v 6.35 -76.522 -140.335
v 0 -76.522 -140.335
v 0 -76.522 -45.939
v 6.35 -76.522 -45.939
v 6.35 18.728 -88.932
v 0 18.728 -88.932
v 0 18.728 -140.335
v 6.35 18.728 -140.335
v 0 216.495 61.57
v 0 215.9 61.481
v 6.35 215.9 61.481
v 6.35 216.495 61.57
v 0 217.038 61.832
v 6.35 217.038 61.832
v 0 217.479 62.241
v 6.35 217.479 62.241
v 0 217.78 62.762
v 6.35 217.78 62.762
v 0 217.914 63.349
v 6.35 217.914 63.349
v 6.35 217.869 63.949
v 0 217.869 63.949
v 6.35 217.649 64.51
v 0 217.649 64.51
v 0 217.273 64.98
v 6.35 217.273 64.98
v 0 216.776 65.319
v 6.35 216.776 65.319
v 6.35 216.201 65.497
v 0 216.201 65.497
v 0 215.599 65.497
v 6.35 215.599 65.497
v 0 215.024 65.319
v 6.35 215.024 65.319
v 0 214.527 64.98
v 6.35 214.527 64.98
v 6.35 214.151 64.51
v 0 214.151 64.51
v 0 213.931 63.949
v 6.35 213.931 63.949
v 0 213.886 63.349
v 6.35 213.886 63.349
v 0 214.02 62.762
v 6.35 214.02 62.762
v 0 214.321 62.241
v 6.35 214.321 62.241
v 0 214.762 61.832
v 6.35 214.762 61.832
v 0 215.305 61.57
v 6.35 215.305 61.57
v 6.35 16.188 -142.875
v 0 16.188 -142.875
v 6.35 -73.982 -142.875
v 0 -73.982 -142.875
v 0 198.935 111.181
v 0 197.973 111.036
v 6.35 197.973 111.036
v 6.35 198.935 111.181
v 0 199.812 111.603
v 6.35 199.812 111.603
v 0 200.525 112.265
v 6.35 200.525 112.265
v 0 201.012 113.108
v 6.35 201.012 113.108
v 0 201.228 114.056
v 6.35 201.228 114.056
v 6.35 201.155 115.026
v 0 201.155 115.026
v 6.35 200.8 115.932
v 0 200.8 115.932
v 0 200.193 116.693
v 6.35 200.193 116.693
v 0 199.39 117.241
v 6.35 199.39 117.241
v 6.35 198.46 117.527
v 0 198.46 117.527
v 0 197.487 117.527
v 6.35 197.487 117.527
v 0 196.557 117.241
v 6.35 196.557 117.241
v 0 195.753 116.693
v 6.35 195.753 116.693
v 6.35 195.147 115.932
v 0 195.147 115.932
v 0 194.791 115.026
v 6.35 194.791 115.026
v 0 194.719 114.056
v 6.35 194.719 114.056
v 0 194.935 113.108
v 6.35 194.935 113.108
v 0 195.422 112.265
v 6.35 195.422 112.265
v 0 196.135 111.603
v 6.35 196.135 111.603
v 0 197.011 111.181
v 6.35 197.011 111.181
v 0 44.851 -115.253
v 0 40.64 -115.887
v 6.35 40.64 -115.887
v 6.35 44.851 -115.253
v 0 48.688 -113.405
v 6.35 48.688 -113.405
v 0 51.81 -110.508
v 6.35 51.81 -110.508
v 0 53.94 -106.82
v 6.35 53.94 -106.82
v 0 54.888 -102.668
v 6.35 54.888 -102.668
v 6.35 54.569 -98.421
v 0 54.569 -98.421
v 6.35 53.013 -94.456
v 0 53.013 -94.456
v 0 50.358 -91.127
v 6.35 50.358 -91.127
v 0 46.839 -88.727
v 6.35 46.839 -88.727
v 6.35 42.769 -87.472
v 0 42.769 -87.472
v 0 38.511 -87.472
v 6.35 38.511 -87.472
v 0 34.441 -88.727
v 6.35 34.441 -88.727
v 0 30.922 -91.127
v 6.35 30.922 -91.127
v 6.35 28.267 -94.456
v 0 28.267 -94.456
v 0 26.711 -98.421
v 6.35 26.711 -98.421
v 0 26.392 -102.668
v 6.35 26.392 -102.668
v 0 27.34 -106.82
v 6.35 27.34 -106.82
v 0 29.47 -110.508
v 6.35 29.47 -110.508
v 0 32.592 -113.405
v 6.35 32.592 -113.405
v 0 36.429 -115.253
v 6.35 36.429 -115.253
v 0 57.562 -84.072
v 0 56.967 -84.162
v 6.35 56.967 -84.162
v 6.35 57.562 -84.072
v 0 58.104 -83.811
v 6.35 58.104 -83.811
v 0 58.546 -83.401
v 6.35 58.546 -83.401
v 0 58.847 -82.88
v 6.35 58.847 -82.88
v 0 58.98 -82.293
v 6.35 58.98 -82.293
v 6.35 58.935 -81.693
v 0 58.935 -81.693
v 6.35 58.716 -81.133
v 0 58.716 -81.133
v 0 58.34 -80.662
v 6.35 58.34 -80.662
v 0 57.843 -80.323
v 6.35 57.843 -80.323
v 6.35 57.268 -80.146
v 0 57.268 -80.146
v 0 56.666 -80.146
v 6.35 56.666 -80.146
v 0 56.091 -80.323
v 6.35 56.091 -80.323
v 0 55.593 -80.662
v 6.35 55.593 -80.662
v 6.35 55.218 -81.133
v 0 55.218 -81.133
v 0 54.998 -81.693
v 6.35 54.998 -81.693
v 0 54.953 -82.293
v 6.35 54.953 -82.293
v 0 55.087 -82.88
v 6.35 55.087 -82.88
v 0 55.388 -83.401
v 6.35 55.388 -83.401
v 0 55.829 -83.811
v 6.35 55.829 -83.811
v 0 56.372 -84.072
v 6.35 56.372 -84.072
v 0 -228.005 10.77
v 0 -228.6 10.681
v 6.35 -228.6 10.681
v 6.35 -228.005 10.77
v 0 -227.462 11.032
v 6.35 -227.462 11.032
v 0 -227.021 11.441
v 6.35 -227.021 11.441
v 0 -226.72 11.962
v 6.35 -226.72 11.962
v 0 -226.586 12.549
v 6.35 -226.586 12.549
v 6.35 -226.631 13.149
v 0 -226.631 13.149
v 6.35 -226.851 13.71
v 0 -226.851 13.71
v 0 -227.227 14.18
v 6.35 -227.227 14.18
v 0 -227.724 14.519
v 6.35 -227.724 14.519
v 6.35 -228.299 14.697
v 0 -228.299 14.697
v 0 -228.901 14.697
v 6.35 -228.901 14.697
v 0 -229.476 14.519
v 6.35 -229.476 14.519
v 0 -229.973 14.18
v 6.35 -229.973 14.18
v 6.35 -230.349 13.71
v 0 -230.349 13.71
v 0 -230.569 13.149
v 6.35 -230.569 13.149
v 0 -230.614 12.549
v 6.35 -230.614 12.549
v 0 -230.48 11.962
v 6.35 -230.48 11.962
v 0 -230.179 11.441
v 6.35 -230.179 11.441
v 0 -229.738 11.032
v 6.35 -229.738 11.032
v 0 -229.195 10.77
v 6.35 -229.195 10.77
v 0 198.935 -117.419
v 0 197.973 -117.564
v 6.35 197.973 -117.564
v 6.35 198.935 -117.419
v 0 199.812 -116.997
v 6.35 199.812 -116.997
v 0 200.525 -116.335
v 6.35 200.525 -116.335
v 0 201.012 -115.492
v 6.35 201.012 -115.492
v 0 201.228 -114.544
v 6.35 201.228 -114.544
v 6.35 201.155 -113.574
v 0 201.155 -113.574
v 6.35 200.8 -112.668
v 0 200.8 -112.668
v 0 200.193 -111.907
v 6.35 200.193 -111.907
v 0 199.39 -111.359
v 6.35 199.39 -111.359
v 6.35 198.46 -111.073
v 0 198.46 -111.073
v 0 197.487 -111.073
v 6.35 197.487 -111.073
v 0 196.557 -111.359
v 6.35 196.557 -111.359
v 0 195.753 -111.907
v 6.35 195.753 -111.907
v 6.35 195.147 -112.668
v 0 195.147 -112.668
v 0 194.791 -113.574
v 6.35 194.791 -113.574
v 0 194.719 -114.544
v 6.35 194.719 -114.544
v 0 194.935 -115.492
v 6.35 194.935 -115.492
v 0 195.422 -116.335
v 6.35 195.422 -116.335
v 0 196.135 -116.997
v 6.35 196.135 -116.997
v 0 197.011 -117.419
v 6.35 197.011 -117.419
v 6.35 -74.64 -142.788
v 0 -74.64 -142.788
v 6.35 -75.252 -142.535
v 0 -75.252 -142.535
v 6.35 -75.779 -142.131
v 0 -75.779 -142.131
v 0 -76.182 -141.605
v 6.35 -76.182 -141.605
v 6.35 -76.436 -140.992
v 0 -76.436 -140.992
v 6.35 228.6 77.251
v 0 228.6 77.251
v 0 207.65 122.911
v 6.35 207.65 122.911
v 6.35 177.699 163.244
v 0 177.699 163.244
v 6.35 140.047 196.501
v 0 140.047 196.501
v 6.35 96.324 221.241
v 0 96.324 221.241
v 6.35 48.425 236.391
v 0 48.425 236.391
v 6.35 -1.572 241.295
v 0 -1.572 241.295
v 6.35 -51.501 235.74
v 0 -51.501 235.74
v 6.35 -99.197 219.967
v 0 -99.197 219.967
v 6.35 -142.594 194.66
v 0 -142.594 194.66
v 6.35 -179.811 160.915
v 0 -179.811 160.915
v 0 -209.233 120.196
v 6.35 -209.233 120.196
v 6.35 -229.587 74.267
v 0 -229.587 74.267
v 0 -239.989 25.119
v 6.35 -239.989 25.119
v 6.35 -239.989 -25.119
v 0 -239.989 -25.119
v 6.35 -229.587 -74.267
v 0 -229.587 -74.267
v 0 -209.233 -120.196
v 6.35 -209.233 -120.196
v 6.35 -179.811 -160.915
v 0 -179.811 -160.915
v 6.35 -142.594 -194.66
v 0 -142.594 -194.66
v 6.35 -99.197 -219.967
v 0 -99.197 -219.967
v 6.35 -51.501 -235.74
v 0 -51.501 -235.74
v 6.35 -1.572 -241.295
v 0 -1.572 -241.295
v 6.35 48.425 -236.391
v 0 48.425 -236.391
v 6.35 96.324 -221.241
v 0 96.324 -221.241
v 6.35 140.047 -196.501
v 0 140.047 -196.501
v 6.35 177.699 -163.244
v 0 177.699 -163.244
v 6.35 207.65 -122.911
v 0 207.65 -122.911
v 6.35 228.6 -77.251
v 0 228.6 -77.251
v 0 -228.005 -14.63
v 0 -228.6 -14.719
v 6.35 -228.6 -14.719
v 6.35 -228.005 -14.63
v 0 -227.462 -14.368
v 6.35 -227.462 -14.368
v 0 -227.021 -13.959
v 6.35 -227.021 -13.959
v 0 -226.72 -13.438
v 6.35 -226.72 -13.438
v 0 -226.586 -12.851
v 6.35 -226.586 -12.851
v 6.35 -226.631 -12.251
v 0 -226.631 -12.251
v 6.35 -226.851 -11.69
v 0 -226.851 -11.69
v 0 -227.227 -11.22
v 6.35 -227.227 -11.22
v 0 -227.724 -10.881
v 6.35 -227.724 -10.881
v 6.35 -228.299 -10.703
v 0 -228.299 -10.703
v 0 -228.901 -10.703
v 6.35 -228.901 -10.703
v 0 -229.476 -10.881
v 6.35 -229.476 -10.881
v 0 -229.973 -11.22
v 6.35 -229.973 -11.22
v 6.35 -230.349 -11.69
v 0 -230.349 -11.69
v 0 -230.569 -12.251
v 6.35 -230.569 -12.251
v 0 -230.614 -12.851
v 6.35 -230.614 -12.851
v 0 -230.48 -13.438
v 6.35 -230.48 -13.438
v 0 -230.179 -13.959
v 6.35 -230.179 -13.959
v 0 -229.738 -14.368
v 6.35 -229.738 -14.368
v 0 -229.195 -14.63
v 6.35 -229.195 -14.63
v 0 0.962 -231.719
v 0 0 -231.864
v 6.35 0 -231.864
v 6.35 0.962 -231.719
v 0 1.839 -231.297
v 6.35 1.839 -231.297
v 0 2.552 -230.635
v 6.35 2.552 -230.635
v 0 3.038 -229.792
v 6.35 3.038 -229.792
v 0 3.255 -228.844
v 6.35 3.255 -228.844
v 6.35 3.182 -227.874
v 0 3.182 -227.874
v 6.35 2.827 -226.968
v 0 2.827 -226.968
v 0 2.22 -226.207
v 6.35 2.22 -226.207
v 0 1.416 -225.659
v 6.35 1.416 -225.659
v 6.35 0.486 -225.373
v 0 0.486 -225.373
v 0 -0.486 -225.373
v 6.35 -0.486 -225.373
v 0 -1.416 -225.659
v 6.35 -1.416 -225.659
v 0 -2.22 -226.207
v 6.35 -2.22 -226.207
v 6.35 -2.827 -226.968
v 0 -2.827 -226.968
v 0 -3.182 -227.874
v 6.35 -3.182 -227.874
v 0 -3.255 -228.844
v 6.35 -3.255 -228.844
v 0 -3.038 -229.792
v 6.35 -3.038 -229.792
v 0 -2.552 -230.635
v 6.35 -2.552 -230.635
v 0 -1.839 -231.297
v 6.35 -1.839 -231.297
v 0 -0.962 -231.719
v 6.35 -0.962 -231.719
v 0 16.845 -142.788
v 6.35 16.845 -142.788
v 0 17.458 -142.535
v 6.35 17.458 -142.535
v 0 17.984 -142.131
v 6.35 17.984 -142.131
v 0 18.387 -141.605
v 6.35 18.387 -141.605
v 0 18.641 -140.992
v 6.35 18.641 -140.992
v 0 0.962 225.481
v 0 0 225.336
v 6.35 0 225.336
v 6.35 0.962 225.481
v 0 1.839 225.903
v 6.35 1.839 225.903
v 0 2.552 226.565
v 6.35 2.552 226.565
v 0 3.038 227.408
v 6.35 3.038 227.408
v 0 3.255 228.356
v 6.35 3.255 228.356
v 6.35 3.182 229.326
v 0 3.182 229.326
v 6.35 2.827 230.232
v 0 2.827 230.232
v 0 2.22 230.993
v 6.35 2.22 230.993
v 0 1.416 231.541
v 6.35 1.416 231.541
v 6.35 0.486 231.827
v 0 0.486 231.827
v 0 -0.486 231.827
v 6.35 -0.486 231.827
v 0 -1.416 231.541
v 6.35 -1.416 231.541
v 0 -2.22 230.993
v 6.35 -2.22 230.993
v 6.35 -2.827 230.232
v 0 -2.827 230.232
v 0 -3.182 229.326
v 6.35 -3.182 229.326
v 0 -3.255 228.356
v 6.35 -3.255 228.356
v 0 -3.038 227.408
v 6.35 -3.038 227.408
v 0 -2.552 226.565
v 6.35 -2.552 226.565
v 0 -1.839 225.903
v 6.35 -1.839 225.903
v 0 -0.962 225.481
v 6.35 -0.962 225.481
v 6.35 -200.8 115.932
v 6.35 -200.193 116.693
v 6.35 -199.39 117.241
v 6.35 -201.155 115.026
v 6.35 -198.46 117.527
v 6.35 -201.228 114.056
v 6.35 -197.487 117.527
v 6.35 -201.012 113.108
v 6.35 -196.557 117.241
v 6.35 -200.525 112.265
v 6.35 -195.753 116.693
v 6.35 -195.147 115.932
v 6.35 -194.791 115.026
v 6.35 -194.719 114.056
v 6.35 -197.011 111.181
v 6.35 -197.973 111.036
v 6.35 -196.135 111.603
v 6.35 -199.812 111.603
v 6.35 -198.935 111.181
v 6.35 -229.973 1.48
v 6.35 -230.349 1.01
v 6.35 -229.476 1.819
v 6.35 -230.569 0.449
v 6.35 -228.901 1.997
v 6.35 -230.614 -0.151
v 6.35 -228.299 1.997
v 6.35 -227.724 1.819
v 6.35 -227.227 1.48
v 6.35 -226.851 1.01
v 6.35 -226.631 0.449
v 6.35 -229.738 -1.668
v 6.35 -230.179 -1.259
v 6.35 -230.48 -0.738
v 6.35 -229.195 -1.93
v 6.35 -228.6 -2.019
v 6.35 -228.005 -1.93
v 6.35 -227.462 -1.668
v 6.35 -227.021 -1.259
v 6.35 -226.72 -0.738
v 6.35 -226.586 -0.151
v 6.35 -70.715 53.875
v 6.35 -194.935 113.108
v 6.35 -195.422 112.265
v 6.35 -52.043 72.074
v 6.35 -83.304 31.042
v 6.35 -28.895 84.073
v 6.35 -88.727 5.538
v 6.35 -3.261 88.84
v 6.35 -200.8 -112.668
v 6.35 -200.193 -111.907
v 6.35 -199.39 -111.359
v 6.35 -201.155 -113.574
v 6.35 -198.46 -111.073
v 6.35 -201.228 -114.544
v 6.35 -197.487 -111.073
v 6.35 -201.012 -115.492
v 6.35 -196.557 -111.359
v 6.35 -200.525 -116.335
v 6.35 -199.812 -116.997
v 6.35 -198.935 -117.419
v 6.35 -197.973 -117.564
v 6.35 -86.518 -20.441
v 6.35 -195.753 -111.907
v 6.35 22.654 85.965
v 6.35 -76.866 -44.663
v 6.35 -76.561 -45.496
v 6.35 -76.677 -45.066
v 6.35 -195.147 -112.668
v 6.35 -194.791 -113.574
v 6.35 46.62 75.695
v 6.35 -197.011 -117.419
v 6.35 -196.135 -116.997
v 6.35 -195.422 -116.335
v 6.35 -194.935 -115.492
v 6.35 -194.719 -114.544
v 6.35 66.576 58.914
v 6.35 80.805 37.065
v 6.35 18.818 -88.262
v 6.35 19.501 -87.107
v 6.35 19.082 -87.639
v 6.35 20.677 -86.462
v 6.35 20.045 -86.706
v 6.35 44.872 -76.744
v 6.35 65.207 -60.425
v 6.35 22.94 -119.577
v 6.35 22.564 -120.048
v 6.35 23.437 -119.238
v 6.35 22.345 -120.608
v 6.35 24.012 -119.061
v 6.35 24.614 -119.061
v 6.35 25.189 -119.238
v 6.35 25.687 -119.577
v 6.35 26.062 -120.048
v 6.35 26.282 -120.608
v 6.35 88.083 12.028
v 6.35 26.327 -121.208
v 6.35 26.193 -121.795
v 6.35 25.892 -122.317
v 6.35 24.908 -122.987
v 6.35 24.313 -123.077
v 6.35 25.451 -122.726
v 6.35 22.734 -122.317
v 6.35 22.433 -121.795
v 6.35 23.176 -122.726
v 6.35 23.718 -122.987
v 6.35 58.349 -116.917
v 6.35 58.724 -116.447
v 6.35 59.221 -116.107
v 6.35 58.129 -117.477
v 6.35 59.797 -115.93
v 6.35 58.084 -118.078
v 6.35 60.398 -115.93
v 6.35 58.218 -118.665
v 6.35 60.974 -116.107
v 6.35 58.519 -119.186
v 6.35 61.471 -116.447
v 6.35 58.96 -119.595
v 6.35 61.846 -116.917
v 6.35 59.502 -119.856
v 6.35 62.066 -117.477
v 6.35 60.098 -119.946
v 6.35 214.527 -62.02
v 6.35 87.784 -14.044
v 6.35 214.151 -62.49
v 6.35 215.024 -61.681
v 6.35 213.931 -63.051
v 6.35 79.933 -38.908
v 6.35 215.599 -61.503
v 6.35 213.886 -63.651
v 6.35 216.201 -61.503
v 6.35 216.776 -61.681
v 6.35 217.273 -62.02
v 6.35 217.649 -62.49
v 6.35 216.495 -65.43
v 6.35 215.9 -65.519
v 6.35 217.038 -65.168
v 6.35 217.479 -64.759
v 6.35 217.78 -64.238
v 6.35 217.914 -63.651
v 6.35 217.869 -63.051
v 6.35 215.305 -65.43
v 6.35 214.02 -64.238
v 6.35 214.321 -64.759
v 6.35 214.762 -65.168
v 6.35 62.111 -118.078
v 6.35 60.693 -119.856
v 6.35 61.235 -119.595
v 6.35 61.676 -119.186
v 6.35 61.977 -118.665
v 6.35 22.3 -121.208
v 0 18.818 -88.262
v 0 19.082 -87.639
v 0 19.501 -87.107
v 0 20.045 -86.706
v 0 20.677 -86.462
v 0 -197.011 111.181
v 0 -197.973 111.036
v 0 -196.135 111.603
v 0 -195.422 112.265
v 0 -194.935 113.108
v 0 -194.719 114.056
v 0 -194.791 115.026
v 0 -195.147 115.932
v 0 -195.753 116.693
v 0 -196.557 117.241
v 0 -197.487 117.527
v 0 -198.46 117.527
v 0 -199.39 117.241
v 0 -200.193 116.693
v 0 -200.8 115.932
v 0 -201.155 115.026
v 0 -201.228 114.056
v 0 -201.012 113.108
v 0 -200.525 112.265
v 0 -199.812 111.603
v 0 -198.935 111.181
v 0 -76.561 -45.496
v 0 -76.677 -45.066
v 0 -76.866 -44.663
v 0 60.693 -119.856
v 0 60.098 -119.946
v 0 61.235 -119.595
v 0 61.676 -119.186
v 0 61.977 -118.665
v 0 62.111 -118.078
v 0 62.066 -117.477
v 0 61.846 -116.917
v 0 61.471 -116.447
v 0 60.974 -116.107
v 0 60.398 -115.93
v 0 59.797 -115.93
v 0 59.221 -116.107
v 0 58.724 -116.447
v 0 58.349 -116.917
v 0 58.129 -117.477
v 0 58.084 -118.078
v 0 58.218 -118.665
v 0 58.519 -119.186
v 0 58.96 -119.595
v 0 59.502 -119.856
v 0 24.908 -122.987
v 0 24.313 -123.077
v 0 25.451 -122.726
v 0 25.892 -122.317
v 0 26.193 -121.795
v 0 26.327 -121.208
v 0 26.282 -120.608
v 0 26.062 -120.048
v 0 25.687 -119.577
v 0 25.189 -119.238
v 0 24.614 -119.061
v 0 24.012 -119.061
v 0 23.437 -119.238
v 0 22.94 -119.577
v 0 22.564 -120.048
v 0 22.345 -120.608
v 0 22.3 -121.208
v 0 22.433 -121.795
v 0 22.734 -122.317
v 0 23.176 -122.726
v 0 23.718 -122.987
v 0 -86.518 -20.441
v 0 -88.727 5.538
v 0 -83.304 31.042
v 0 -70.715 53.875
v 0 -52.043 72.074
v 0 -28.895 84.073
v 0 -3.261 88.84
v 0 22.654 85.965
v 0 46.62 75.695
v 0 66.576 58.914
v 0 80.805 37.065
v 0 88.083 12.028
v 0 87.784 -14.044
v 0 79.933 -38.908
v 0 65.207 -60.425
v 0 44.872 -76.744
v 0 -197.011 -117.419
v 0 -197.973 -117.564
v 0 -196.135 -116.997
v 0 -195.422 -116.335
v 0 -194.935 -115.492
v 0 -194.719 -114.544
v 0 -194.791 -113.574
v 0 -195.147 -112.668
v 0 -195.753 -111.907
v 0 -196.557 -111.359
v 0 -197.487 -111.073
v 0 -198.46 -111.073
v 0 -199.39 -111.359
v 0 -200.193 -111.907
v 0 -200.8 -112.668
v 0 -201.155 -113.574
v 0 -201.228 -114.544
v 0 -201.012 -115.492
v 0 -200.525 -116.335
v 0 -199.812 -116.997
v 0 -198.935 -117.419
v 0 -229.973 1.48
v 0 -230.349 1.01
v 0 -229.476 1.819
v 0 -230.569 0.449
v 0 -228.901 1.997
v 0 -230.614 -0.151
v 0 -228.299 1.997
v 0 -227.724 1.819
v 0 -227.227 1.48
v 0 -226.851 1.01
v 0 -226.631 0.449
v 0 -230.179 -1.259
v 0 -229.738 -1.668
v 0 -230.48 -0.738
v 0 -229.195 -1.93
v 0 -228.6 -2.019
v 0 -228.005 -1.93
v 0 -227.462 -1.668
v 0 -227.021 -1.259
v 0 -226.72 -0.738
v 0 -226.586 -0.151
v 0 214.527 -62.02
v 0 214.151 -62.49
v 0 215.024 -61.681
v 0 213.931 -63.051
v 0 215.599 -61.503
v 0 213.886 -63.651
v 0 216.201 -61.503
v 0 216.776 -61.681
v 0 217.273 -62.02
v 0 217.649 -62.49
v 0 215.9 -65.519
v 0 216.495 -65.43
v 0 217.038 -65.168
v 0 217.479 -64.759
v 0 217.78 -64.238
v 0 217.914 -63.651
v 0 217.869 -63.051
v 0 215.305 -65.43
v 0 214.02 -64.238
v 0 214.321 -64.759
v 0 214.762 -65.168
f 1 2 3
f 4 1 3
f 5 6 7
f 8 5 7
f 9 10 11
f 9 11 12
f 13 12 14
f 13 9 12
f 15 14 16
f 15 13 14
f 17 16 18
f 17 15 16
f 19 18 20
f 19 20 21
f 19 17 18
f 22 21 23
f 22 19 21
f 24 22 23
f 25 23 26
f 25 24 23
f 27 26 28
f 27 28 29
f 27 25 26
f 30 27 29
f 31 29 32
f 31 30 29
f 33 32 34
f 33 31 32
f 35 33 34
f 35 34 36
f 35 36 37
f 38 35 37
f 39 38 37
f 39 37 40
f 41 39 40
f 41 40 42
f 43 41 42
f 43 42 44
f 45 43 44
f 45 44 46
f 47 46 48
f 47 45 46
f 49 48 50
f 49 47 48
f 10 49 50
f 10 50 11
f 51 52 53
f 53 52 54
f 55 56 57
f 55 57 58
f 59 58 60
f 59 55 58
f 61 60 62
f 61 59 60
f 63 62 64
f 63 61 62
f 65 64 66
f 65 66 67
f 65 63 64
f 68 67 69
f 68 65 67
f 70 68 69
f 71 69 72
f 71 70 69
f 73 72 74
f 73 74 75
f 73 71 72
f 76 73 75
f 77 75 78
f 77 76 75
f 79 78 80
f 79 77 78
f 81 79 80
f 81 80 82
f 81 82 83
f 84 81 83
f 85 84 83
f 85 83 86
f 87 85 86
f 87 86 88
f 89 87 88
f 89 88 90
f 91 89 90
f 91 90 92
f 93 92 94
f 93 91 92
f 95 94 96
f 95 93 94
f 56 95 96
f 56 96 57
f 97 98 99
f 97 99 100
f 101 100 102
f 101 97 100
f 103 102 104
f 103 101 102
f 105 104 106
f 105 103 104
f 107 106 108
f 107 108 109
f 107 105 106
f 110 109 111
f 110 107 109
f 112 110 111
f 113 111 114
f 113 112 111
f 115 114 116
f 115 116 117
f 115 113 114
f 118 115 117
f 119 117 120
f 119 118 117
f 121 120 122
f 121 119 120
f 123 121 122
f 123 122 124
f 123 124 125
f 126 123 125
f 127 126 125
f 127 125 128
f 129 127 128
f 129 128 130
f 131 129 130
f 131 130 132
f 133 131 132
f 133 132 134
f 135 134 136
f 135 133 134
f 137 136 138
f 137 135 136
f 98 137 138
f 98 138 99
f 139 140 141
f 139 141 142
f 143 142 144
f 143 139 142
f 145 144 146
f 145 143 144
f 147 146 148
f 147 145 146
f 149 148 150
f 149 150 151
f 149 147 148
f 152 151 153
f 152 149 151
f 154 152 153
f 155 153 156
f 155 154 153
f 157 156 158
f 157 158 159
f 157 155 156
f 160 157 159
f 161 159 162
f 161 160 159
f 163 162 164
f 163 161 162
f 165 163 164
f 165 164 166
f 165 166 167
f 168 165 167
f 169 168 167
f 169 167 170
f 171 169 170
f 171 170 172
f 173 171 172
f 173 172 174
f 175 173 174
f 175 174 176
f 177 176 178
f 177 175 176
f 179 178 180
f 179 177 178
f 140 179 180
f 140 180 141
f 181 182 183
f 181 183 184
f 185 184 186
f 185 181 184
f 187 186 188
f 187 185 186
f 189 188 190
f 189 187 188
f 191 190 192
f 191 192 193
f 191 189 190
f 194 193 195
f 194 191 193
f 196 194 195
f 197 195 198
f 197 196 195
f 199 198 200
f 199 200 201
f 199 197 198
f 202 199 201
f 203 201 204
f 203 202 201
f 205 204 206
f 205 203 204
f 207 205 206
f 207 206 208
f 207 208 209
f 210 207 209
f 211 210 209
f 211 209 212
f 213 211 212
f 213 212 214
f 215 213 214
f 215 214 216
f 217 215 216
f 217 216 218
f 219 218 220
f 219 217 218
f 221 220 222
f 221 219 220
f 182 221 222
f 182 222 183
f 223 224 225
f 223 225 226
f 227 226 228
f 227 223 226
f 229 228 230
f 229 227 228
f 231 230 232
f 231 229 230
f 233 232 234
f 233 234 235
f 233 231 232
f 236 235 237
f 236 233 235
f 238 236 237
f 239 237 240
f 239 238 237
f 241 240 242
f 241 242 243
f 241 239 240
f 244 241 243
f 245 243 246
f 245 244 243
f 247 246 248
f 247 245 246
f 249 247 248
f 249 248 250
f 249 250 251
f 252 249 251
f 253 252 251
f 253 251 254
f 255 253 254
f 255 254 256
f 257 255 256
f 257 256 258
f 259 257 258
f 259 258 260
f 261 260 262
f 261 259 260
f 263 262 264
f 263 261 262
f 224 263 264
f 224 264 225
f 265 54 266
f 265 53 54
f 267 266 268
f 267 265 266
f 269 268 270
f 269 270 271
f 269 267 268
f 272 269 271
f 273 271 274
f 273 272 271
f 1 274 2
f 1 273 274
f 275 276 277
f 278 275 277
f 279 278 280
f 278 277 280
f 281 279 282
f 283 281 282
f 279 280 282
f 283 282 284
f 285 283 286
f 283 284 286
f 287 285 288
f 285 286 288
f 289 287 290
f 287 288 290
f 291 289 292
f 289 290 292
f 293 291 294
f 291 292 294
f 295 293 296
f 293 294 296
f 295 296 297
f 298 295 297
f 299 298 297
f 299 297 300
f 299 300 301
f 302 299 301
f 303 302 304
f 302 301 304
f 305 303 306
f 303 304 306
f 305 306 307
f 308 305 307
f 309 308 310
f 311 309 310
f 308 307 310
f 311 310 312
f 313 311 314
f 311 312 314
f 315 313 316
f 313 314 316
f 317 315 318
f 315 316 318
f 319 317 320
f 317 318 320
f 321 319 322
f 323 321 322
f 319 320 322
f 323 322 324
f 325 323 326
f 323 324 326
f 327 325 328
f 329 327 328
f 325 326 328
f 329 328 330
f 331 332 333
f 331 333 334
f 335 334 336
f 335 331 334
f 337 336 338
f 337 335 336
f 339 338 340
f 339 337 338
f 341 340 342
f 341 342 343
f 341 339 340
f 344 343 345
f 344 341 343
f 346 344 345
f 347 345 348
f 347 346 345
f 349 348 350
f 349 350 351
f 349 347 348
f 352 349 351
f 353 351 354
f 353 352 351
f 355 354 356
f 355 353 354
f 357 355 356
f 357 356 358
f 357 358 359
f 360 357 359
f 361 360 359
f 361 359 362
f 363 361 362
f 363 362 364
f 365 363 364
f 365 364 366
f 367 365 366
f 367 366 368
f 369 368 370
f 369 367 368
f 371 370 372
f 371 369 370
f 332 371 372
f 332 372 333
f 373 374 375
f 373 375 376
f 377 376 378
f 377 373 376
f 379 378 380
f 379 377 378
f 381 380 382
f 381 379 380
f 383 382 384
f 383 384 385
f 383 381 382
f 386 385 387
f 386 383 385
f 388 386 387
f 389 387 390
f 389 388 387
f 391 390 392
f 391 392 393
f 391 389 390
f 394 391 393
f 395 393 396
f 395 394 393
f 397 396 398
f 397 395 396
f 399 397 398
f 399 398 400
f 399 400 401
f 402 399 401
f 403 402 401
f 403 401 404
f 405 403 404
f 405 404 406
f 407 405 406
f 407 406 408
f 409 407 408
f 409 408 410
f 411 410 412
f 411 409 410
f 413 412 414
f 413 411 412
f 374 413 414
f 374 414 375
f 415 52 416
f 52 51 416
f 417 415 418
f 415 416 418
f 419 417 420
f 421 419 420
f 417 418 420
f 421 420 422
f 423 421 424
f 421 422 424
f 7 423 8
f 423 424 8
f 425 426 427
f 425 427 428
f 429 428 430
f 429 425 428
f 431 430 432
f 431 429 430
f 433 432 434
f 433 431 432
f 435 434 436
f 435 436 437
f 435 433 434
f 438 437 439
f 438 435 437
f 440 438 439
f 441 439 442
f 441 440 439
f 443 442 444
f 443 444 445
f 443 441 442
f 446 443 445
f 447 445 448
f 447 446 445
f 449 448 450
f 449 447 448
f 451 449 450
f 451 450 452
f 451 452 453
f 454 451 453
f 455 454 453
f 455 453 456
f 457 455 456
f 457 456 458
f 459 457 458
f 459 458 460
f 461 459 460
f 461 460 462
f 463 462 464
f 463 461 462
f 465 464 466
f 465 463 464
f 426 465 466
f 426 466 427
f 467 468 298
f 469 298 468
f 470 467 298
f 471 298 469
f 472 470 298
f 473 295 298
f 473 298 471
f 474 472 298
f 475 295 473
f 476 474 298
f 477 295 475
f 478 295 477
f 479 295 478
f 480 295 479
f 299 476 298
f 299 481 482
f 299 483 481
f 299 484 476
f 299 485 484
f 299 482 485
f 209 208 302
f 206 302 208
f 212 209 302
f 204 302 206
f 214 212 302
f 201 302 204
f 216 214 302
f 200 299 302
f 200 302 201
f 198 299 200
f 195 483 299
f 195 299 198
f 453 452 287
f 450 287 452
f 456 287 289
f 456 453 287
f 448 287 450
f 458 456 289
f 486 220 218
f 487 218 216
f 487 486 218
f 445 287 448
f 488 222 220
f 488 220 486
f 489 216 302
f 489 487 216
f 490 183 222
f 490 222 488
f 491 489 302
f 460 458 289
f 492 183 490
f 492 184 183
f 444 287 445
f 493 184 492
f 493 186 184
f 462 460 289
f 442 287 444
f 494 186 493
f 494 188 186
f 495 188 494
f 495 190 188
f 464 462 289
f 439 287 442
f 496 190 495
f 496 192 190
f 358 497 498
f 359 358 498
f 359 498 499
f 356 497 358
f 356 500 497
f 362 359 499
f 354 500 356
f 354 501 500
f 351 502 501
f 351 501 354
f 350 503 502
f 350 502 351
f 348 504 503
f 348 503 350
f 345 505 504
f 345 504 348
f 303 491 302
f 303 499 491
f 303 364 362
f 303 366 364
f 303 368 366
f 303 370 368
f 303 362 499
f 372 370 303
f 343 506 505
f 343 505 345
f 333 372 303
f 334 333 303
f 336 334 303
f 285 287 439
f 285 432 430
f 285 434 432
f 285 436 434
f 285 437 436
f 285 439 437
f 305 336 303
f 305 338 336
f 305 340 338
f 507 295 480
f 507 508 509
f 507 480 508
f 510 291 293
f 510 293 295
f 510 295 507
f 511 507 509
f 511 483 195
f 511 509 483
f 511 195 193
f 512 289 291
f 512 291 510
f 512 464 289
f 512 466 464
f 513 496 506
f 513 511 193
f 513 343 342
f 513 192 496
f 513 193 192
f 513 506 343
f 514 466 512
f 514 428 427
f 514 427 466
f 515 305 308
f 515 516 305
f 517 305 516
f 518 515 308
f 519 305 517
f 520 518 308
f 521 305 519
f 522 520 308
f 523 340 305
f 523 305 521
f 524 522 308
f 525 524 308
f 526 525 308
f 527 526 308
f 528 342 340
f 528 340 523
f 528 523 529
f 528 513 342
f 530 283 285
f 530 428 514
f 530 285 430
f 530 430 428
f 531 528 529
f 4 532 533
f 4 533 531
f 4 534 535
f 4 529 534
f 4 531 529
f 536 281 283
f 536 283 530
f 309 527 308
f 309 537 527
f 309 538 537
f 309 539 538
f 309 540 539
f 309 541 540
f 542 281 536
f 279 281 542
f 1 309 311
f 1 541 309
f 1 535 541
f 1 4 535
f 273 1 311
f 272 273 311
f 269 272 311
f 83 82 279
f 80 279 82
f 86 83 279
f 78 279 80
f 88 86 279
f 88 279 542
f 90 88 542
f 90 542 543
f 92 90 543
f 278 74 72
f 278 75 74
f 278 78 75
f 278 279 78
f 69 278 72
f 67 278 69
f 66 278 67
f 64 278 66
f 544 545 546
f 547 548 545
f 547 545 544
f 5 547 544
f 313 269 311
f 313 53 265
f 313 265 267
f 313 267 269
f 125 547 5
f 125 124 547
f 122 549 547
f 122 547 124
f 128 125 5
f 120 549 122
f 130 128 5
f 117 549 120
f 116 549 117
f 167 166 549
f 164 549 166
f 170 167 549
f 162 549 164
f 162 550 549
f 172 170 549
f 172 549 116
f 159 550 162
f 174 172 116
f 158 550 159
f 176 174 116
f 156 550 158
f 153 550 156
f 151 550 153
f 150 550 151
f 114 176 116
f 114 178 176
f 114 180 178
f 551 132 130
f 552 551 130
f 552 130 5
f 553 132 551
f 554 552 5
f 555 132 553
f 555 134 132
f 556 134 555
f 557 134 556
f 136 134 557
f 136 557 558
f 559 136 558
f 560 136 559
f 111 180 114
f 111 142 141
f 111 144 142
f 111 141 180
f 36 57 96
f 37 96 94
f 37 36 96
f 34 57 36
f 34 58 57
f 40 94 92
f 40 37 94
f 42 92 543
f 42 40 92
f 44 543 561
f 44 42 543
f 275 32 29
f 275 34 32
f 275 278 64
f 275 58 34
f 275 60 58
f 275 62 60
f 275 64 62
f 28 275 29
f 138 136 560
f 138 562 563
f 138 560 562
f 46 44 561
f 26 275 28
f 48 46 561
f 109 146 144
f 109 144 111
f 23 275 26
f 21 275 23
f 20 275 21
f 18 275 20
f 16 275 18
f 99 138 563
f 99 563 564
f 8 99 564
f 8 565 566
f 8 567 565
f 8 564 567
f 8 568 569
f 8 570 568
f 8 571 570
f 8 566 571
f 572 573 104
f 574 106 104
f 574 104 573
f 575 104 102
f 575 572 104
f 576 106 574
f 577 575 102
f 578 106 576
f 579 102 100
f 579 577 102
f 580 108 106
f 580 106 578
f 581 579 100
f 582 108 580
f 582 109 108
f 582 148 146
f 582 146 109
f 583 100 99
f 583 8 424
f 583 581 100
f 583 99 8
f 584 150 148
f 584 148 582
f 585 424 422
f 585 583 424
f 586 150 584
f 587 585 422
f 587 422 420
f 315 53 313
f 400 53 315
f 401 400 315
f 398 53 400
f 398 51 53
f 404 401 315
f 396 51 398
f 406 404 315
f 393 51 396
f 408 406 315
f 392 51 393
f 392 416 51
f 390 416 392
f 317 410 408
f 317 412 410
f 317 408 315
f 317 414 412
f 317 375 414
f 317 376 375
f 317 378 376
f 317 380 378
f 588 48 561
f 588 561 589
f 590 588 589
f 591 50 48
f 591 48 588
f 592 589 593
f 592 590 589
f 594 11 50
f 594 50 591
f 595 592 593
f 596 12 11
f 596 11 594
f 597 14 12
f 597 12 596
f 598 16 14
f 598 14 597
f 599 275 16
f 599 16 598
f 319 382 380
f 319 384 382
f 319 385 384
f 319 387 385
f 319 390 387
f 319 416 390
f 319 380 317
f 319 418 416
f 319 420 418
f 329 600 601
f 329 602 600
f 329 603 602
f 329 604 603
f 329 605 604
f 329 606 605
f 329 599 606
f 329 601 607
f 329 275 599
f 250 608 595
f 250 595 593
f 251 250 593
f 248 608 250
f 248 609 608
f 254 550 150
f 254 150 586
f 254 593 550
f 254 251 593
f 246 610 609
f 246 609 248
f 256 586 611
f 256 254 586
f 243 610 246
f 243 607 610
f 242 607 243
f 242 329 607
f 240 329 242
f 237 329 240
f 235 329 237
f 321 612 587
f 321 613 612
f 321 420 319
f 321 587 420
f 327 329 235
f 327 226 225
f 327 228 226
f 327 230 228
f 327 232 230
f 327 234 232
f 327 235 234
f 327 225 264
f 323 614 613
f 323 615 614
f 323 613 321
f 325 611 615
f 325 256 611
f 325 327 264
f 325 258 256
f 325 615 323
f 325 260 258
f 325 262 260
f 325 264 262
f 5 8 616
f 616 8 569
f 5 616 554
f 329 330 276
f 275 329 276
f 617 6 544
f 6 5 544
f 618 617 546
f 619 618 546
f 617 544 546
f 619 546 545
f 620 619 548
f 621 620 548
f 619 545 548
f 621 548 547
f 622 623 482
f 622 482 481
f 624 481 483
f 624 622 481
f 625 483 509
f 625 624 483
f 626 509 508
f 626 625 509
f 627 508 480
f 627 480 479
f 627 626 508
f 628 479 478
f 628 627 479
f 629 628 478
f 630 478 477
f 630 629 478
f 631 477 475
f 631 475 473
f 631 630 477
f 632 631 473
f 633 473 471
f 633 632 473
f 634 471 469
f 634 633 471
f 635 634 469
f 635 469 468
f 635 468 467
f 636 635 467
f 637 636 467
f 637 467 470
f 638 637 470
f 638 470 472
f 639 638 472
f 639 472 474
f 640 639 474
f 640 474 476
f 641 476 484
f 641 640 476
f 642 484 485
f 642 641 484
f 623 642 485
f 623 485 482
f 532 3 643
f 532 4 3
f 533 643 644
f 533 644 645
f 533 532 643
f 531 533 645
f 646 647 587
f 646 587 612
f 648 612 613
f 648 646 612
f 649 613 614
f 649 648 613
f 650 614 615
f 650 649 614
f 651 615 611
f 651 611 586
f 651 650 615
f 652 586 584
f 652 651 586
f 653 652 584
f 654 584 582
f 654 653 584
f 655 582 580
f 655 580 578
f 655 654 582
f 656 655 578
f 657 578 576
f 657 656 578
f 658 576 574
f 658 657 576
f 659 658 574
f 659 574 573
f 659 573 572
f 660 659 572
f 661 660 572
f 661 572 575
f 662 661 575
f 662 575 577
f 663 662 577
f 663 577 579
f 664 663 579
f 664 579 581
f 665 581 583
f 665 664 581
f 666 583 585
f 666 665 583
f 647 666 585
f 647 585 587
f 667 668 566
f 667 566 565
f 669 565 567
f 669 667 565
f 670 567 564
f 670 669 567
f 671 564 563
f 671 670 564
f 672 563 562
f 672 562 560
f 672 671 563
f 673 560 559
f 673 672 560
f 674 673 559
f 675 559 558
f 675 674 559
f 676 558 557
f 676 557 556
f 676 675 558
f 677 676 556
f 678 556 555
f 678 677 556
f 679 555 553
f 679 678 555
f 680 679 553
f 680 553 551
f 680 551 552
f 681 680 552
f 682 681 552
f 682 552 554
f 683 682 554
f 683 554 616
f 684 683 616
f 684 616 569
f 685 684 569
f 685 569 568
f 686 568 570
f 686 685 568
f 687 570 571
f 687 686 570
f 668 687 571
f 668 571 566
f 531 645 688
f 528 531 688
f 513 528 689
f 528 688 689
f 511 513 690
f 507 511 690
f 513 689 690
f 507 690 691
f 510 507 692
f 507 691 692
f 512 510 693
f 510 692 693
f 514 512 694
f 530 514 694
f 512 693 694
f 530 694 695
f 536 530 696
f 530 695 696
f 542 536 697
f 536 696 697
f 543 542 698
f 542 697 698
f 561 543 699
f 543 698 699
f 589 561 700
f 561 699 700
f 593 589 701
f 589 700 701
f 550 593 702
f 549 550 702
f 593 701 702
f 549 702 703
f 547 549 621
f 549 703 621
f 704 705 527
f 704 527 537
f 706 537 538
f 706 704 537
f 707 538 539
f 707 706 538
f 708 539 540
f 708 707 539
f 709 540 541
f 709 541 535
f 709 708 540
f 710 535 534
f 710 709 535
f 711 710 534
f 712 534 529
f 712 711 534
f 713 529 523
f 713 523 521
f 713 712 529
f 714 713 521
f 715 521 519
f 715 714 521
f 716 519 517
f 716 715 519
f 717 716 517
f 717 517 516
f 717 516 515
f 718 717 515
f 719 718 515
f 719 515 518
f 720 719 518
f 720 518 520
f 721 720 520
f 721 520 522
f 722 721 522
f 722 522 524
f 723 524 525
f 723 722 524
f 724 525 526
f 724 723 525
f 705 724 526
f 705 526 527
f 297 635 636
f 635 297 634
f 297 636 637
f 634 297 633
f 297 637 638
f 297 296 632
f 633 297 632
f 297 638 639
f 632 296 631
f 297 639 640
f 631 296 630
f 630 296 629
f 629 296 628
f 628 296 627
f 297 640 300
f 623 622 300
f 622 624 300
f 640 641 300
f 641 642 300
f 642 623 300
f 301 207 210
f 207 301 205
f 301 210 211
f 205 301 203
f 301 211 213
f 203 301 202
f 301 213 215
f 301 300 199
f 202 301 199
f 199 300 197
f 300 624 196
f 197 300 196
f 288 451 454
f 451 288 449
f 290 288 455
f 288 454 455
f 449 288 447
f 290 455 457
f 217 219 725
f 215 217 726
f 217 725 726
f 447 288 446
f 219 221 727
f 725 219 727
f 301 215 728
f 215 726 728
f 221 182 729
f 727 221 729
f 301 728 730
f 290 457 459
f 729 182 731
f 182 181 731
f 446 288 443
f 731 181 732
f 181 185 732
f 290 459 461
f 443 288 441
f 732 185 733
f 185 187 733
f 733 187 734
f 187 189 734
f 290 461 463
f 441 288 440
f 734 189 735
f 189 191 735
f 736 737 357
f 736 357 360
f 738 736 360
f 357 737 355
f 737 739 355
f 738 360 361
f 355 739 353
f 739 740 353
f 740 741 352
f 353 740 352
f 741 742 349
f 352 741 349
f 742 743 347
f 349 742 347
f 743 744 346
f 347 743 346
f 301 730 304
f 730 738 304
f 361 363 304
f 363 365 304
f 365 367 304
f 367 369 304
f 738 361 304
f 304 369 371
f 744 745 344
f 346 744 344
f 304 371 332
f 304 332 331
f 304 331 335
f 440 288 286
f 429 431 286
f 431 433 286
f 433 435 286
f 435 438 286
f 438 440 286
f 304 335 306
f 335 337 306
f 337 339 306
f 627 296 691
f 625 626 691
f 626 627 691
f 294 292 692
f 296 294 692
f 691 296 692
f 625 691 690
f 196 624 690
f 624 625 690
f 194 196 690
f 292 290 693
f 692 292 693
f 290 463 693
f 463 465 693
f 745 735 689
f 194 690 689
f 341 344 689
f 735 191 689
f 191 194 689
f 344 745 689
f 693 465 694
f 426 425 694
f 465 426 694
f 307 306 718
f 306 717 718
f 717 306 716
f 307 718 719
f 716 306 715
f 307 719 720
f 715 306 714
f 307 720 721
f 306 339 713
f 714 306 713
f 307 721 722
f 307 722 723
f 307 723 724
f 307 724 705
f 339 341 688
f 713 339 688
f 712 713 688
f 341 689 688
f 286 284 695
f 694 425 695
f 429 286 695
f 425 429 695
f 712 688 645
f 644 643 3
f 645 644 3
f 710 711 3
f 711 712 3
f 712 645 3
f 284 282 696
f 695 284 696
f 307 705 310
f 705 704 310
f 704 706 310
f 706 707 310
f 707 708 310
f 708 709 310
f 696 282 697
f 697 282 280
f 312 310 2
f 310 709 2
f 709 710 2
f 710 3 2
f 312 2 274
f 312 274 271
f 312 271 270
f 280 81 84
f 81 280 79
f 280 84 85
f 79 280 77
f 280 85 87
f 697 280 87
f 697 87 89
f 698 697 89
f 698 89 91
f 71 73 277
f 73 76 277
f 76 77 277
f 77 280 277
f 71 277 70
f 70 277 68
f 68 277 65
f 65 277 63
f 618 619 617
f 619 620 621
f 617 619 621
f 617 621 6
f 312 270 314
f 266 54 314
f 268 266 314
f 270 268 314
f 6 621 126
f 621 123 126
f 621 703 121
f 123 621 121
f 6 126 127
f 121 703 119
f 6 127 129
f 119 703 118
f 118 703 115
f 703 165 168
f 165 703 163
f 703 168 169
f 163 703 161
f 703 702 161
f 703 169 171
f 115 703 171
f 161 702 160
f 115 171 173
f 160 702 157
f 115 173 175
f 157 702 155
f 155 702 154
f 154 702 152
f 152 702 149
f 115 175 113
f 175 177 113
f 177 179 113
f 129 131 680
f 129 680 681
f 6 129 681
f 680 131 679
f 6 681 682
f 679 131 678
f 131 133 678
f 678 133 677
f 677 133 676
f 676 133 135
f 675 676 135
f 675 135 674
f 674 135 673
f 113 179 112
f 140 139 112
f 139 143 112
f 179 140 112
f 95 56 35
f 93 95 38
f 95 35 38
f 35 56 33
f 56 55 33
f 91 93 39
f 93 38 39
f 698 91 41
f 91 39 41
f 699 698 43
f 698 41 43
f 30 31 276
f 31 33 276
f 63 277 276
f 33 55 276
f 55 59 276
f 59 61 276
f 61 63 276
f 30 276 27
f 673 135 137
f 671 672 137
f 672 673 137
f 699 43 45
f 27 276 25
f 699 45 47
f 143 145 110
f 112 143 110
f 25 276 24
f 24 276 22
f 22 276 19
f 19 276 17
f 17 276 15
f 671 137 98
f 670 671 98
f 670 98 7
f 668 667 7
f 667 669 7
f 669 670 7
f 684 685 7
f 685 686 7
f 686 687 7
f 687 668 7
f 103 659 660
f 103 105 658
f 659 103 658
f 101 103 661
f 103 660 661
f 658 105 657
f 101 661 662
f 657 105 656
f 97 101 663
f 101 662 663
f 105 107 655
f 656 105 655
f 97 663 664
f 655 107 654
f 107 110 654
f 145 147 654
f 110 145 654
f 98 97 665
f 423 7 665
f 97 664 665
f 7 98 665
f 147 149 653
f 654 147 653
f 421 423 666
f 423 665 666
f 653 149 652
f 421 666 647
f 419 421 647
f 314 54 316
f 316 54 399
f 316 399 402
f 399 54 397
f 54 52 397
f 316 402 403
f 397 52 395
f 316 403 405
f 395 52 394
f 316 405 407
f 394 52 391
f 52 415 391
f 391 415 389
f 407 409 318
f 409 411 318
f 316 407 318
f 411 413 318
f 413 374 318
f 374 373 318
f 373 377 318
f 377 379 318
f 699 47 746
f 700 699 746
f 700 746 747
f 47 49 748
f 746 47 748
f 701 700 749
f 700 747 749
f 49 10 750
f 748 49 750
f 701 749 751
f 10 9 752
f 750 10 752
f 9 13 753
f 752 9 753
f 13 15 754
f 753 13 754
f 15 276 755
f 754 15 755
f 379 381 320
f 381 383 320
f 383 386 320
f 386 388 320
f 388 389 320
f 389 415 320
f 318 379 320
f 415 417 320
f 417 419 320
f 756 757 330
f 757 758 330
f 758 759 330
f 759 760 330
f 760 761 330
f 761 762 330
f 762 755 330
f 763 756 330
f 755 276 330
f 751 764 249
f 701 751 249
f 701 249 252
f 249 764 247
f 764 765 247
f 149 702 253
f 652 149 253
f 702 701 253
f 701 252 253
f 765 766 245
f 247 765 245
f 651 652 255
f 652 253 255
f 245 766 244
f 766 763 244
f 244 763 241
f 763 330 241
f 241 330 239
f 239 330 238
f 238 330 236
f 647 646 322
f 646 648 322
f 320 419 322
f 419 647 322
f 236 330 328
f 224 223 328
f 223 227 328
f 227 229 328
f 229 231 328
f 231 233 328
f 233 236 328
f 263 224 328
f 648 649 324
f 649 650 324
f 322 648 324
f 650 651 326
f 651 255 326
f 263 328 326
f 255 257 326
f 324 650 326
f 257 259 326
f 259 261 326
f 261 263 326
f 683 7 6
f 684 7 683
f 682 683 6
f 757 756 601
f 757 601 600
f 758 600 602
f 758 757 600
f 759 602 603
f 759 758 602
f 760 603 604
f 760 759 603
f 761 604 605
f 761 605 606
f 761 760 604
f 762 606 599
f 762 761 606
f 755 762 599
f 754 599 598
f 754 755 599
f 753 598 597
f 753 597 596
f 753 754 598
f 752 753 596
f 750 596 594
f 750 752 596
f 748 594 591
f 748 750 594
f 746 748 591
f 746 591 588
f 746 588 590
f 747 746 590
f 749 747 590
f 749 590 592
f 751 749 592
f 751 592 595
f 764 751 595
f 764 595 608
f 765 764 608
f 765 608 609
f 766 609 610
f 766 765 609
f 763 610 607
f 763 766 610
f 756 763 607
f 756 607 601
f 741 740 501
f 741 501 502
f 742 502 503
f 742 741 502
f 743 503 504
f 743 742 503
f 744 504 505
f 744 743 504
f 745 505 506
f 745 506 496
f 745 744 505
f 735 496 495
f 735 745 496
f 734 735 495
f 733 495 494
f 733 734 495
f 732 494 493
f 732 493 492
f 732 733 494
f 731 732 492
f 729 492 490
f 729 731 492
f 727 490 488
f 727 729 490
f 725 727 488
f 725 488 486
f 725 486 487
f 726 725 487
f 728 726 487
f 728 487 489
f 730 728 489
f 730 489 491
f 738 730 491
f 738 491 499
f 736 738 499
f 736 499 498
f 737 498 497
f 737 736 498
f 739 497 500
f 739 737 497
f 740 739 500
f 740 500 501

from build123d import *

# Parameters (mm, degrees)
SKETCH1_R           = 3.2639
SKETCH1_R_2         = 2.0193
SKETCH1_R_3         = 14.2875
BOSS_EXTRUDE1_DEPTH = 6.35
FILLET1_R           = 2.54


with BuildPart() as part:
    # Sketch1 → Boss-Extrude1 (new body)
    with BuildSketch(Plane(origin=(0, 0, 0), x_dir=(0, 0, -1), z_dir=(1, 0, 0))):
        with BuildLine():
            Line((77.251084135, 228.6), (-77.251084135, 228.6))
            ThreePointArc((-77.251084135, 228.6), (0, -241.3), (77.251084135, 228.6))
        make_face()
        with Locations((-114.3, -197.973407305)):
            Circle(SKETCH1_R, mode=Mode.SUBTRACT)
        with Locations((-12.7, -228.6)):
            Circle(SKETCH1_R_2, mode=Mode.SUBTRACT)
        with Locations((0, -228.6)):
            Circle(SKETCH1_R_2, mode=Mode.SUBTRACT)
        with Locations((12.7, -228.6)):
            Circle(SKETCH1_R_2, mode=Mode.SUBTRACT)
        with Locations((114.3, -197.973407305)):
            Circle(SKETCH1_R, mode=Mode.SUBTRACT)
        with Locations((228.6, 0)):
            Circle(SKETCH1_R, mode=Mode.SUBTRACT)
        with Locations((-228.6, 0)):
            Circle(SKETCH1_R, mode=Mode.SUBTRACT)
        with Locations((-114.3, 197.973407305)):
            Circle(SKETCH1_R, mode=Mode.SUBTRACT)
        with Locations((-63.5, 215.9)):
            Circle(SKETCH1_R_2, mode=Mode.SUBTRACT)
        with BuildLine():
            Line((142.875, -76.522457682), (45.249568731, -76.522457682))
            ThreePointArc((45.249568731, -76.522457682), (-81.451531518, 35.6210333), (86.905058303, 18.727542318))
            Line((86.905058303, 18.727542318), (142.875, 18.727542318))
            Line((142.875, 18.727542318), (142.875, -76.522457682))
        make_face(mode=Mode.SUBTRACT)
        with Locations((82.142471145, 56.966805286)):
            Circle(SKETCH1_R_2, mode=Mode.SUBTRACT)
        with Locations((101.6, 40.64)):
            Circle(SKETCH1_R_3, mode=Mode.SUBTRACT)
        with Locations((117.926805286, 60.097528855)):
            Circle(SKETCH1_R_2, mode=Mode.SUBTRACT)
        with Locations((121.057528855, 24.313194714)):
            Circle(SKETCH1_R_2, mode=Mode.SUBTRACT)
        with Locations((114.3, 197.973407305)):
            Circle(SKETCH1_R, mode=Mode.SUBTRACT)
        with Locations((63.5, 215.9)):
            Circle(SKETCH1_R_2, mode=Mode.SUBTRACT)
    extrude(amount=BOSS_EXTRUDE1_DEPTH)

    # Fillet1
    fillet1_edges = [part.edges().sort_by_distance(p)[0] for p in [
        (3.175, -76.522457682, -45.249568731),
        (3.175, -76.522457682, -142.875),
        (3.175, 18.727542318, -142.875),
        (3.175, 18.727542318, -86.905058303),
    ]]
    fillet(fillet1_edges, radius=FILLET1_R)


solid = part.part
